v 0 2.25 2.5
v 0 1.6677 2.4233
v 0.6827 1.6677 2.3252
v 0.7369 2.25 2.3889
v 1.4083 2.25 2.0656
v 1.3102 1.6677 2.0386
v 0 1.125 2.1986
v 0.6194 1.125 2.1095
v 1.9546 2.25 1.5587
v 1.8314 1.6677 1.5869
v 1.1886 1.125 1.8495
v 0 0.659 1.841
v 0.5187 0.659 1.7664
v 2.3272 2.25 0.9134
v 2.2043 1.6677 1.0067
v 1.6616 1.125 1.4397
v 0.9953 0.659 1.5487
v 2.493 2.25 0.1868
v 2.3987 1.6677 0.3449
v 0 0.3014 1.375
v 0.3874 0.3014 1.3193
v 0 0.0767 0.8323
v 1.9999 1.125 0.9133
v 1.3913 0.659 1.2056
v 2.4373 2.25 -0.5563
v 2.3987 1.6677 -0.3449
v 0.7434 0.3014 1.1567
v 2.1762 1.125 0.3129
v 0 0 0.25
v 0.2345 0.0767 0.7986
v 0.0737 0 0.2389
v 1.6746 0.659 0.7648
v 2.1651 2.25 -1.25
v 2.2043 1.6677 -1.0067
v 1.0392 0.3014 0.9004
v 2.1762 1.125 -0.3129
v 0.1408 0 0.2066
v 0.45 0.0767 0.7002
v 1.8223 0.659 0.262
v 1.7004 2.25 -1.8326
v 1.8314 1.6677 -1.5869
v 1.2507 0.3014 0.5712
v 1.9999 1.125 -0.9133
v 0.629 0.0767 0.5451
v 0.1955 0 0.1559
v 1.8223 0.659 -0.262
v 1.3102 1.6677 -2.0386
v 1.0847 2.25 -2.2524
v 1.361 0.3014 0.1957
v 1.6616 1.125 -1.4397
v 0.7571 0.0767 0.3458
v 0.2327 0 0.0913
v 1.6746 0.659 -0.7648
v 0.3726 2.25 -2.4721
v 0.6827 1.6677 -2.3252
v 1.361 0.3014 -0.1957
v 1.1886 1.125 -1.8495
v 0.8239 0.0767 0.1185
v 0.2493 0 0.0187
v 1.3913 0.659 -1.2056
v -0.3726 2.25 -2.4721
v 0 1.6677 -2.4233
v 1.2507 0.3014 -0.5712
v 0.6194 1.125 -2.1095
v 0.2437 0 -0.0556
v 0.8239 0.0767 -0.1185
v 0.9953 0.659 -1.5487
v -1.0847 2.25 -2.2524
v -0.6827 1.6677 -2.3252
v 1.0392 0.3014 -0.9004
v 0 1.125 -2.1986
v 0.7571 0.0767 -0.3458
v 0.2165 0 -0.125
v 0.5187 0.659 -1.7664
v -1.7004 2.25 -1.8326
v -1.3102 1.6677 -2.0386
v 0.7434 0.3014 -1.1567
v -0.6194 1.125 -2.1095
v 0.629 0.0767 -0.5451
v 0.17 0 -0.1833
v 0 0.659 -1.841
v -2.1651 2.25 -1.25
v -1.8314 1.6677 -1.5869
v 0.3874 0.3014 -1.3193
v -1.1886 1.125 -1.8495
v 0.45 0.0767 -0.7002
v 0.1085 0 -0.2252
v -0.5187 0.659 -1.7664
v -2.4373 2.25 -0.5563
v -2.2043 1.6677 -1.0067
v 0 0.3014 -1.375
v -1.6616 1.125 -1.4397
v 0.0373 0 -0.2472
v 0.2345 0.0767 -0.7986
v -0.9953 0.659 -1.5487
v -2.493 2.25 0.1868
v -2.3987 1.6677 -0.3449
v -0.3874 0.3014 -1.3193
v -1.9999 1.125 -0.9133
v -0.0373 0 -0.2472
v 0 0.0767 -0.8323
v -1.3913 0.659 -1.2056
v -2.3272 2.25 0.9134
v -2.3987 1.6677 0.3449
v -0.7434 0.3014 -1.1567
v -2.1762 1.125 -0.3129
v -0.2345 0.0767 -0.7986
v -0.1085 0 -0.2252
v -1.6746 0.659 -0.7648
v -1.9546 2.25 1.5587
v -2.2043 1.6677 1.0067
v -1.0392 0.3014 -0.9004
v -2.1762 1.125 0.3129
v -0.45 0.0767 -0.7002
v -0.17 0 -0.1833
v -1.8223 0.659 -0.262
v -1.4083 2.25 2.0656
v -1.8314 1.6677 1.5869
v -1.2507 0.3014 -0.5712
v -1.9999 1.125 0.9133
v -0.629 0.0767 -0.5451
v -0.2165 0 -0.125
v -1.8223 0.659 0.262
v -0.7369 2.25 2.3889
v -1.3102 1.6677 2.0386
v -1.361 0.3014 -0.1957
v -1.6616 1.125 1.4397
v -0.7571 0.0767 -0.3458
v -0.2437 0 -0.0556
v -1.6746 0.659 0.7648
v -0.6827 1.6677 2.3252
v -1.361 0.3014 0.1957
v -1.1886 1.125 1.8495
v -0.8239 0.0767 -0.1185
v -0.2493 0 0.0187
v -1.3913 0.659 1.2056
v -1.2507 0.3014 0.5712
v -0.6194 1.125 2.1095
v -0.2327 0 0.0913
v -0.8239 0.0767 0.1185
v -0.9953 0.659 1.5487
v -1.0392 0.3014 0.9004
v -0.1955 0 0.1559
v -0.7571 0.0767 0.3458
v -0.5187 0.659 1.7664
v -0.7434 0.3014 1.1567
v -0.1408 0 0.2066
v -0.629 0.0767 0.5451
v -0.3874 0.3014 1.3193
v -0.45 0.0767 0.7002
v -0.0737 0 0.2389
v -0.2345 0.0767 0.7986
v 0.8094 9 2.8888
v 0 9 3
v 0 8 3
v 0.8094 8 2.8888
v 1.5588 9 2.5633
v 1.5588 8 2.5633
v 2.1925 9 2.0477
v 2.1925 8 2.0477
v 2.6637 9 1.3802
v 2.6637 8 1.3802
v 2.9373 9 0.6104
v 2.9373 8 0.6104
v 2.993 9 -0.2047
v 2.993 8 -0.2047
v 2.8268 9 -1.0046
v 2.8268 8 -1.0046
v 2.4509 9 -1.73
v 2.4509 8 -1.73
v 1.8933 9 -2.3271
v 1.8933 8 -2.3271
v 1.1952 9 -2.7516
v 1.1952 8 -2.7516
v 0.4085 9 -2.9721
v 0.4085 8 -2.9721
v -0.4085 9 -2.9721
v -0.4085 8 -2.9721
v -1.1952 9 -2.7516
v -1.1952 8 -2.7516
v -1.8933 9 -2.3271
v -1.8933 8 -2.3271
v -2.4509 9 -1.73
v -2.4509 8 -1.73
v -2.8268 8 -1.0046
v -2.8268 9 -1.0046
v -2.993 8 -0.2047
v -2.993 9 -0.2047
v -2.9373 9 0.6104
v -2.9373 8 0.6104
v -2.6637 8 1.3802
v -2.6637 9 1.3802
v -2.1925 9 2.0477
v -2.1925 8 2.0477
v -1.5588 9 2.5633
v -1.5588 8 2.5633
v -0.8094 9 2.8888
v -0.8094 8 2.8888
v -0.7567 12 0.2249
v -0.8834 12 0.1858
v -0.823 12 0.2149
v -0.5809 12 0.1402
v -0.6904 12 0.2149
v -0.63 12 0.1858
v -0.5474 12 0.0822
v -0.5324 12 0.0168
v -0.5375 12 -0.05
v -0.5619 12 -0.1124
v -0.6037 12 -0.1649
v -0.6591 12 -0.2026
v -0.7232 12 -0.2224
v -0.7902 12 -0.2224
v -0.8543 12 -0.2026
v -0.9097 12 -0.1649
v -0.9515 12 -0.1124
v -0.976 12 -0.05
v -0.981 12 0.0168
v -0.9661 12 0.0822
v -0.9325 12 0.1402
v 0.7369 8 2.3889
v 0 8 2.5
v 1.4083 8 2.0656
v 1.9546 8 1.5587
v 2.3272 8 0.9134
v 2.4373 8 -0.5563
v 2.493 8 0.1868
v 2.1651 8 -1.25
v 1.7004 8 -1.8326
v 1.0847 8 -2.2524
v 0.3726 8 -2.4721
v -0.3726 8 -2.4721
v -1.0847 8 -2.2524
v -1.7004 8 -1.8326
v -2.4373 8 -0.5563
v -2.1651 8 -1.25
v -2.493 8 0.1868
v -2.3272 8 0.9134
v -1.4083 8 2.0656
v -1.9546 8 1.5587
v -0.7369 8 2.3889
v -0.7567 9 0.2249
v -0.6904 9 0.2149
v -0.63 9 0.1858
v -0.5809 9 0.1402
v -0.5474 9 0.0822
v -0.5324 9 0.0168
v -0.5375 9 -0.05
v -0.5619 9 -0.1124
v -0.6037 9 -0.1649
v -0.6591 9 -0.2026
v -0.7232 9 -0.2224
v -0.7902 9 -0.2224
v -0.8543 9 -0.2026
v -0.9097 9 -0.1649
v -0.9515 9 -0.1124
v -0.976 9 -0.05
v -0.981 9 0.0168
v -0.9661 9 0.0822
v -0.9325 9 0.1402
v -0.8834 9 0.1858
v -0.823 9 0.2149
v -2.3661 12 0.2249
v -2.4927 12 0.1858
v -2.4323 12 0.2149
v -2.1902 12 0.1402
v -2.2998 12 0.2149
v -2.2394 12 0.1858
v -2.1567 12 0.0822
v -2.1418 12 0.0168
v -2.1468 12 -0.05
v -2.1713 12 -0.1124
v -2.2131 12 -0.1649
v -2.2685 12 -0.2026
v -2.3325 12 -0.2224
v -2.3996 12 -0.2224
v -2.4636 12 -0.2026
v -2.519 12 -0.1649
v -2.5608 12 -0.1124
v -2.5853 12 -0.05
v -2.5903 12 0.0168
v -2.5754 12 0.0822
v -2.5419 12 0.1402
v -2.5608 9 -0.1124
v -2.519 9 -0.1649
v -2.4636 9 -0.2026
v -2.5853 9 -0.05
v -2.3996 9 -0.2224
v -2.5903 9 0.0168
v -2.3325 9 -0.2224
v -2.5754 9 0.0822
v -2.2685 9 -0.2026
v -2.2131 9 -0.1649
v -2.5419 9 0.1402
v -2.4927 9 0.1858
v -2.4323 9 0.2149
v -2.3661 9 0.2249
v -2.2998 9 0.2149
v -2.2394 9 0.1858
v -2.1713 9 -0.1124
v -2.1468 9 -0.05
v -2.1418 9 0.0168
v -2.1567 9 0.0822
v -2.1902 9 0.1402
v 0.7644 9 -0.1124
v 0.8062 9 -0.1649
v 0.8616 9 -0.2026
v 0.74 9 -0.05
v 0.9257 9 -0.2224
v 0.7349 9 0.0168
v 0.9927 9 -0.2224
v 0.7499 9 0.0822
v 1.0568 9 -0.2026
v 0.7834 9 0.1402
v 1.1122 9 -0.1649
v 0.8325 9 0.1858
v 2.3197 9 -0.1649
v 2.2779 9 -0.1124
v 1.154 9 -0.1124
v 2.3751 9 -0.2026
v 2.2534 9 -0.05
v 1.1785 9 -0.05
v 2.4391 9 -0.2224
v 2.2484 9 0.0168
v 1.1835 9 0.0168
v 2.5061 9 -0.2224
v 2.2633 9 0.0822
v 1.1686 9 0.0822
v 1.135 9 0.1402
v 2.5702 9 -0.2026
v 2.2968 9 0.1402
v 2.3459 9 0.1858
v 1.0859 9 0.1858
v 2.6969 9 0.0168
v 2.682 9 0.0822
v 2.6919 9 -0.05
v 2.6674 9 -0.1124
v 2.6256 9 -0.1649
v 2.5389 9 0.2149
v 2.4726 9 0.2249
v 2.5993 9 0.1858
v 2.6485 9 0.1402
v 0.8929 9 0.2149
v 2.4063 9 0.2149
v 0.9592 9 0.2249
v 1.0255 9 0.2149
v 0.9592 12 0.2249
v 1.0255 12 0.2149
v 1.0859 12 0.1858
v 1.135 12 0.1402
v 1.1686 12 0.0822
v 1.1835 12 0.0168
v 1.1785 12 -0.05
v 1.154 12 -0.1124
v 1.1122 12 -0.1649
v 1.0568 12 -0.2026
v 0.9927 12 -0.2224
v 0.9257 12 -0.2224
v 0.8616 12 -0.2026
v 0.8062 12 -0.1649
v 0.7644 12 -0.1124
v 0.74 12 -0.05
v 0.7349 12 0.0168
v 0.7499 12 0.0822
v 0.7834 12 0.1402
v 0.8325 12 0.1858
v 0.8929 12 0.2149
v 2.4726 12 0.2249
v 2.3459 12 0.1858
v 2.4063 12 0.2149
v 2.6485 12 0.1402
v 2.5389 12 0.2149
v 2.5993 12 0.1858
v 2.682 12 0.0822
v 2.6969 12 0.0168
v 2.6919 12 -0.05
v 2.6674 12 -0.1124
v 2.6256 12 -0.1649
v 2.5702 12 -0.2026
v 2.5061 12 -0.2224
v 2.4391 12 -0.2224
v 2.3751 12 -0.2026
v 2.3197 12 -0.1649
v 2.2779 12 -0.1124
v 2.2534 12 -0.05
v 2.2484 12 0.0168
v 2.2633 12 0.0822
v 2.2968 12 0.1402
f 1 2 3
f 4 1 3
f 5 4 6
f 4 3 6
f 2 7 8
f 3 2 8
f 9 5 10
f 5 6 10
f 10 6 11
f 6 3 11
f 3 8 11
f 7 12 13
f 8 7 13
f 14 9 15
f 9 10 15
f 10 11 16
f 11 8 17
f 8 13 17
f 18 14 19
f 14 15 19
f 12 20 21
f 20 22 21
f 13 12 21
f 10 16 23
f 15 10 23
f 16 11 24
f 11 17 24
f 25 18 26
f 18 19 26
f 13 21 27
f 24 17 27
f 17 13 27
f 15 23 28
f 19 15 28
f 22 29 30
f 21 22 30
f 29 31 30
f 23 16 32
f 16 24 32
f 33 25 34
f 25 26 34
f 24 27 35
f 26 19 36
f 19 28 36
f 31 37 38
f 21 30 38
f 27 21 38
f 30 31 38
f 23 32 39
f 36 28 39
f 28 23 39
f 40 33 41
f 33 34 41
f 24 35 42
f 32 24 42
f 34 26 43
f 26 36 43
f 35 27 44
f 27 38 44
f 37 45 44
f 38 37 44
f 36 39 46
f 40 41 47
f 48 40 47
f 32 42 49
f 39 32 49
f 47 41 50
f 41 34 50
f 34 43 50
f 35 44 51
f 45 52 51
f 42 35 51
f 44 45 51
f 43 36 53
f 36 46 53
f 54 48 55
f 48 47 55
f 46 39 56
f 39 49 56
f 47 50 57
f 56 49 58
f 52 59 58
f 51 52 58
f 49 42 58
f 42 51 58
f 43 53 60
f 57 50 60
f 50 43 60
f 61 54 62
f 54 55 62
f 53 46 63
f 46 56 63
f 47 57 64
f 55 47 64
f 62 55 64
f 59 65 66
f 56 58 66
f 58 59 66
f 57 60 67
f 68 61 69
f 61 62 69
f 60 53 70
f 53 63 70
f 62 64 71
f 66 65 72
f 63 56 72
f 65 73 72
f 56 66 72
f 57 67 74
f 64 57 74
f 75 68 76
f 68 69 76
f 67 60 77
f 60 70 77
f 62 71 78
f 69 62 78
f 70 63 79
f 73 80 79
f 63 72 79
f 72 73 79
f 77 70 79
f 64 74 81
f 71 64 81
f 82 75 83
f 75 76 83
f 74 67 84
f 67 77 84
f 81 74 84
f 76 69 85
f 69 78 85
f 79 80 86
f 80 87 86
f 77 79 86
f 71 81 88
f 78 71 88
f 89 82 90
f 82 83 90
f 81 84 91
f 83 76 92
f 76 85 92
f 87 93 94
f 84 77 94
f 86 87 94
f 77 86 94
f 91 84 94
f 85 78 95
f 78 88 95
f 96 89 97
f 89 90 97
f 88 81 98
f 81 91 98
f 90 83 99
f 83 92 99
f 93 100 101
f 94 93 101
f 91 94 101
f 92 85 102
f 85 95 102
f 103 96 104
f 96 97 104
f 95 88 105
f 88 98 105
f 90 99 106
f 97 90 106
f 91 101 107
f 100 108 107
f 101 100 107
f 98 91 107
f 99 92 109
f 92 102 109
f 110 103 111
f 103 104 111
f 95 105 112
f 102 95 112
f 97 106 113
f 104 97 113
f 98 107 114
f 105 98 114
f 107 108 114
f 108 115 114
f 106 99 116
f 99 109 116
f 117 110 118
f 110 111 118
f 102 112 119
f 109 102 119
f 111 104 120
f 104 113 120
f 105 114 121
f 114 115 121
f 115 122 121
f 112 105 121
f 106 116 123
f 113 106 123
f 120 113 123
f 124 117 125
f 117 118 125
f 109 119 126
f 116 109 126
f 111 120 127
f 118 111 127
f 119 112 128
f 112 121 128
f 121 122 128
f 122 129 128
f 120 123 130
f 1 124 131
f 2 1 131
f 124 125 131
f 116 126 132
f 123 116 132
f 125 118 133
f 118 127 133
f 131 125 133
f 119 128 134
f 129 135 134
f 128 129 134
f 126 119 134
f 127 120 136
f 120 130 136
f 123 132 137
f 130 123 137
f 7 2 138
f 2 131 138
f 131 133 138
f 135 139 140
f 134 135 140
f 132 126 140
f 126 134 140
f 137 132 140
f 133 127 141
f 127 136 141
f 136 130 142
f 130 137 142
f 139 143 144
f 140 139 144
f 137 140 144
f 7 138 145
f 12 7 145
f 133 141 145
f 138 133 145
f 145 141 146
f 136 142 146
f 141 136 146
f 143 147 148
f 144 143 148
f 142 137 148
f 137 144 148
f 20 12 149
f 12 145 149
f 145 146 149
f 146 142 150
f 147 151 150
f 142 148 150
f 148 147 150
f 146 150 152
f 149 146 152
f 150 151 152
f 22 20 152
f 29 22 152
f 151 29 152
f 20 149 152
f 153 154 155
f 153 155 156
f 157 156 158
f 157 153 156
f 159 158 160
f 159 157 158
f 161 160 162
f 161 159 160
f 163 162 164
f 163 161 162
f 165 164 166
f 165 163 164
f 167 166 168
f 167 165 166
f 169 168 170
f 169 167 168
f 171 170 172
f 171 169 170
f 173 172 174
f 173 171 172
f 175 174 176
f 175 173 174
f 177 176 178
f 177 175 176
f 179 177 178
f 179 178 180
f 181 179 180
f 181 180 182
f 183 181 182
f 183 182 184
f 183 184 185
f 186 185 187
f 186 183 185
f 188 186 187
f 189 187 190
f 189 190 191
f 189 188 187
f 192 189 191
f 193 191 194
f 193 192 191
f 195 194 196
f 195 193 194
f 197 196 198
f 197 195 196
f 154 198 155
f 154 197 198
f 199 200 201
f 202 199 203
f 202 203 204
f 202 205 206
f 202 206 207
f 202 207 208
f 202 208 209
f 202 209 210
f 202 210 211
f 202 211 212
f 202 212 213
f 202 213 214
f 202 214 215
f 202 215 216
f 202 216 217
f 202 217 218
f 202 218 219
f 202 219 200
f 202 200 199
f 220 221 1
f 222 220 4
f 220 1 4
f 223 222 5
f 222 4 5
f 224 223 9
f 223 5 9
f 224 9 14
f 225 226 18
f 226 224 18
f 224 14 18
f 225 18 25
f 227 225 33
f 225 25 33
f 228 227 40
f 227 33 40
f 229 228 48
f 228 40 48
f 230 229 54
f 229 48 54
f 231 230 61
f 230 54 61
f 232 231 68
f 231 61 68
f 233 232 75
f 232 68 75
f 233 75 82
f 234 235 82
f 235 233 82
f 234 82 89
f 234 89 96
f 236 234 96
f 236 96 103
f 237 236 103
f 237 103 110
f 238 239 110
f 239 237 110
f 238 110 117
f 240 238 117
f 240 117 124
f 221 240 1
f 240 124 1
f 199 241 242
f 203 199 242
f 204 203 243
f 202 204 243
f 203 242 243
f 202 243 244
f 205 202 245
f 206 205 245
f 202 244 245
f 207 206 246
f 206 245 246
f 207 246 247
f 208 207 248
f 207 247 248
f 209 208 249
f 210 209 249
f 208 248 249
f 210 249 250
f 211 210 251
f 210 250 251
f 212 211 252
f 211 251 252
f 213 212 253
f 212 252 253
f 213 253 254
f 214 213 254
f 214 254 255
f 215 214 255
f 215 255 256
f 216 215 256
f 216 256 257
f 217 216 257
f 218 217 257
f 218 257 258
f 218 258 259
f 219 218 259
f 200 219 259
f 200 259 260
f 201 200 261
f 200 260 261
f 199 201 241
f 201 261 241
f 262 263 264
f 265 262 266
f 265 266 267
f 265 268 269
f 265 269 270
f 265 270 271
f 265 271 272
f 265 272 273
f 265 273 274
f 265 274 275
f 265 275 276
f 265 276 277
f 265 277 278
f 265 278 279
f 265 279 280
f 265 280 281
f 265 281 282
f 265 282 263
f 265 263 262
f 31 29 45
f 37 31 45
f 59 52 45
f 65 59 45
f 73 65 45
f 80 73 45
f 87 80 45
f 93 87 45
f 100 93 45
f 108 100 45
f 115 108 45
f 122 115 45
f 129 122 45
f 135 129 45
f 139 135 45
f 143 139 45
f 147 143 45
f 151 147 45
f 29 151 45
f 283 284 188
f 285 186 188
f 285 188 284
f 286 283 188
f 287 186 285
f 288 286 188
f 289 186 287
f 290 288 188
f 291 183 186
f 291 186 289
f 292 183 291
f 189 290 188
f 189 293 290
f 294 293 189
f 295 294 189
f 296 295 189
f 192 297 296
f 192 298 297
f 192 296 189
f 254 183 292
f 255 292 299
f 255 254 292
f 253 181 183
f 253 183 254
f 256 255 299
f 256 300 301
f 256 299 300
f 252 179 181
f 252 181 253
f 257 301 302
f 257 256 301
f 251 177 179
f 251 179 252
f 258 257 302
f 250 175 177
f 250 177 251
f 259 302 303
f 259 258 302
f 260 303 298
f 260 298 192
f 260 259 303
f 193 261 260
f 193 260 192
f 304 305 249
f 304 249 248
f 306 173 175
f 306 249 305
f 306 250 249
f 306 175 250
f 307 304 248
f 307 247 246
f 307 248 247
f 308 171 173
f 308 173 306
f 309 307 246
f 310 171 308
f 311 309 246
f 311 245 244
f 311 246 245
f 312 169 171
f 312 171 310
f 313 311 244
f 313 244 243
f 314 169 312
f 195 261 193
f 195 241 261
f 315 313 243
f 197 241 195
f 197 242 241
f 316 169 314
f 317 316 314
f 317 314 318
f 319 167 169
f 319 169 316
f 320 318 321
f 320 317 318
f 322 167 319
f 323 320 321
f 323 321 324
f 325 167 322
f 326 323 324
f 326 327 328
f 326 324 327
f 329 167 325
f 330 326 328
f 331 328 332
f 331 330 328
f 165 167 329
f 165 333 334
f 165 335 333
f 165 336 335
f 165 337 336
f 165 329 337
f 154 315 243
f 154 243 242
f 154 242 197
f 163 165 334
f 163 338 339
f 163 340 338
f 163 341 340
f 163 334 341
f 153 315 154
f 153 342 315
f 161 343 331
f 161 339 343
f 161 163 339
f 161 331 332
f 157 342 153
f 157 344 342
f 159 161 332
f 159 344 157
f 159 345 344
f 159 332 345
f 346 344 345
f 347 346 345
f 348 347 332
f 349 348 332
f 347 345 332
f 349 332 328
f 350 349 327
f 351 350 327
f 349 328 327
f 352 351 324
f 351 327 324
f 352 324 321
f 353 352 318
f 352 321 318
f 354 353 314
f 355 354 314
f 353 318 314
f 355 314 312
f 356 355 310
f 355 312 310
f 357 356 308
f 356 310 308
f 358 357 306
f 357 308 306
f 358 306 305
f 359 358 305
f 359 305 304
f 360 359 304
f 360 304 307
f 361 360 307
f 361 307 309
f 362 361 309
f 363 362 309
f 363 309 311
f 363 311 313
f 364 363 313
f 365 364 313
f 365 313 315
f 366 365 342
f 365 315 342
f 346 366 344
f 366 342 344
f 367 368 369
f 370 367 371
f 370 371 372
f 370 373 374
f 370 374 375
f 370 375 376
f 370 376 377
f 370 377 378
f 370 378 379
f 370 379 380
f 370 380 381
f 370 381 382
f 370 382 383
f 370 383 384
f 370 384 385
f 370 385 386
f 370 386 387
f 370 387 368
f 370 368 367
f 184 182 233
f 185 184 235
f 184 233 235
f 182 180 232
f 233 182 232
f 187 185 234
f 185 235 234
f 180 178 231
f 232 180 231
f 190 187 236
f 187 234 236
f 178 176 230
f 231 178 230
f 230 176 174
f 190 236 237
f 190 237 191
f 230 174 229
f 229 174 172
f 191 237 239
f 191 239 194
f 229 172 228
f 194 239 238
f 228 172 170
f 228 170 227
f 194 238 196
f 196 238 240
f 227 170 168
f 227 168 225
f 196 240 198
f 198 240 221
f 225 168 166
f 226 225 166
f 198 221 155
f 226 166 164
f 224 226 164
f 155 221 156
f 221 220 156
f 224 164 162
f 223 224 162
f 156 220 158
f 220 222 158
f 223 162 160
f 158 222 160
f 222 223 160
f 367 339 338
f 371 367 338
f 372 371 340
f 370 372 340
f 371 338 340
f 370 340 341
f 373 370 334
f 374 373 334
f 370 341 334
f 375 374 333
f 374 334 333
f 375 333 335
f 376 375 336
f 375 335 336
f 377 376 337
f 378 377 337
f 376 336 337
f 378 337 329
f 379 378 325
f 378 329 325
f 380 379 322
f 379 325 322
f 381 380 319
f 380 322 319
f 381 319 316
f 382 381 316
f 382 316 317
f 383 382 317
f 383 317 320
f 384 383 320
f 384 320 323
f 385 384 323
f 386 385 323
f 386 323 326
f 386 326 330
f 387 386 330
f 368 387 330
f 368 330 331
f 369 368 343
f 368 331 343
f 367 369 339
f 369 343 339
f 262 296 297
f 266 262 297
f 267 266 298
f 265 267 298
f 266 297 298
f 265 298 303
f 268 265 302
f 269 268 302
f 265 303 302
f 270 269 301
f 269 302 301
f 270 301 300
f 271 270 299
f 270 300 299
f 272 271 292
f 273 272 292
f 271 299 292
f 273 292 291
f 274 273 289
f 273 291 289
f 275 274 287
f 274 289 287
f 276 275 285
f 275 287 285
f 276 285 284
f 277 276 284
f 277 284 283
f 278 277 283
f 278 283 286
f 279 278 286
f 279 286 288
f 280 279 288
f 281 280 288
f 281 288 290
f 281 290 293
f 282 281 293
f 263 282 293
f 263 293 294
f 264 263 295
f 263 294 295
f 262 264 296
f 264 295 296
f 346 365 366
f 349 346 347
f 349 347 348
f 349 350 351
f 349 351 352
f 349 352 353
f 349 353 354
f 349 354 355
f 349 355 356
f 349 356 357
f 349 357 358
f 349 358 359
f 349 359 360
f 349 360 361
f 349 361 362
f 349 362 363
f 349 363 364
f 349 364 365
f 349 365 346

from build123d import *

# Parameters (mm, degrees)
SKETCH1_R           = 2.5
BOSS_EXTRUDE1_DEPTH = 9
SKETCH2_R           = 3
BOSS_EXTRUDE3_DEPTH = 1
FILLET3_R           = 2.25
SKETCH4_R           = 0.224891602
BOSS_EXTRUDE4_DEPTH = 3


with BuildPart() as part:
    # Sketch1 → Boss-Extrude1 (new body)
    with BuildSketch(Plane(origin=(0, 0, 0), x_dir=(1, 0, 0), z_dir=(0, 1, 0))):
        with Locations(Location((0, 0, 0), (0, 0, 270))):  # turned: the seam where the file's is
            Circle(SKETCH1_R)
    extrude(amount=BOSS_EXTRUDE1_DEPTH)

    # Sketch2 → Boss-Extrude3 (add)
    with BuildSketch(Plane(origin=(0, 9, 0), x_dir=(1, 0, 0), z_dir=(0, 1, 0))):
        with Locations(Location((0, 0, 0), (0, 0, 270))):  # turned: the seam where the file's is
            Circle(SKETCH2_R)
    extrude(amount=-BOSS_EXTRUDE3_DEPTH)

    # Fillet3
    fillet3_edges = [part.edges().sort_by_distance(p)[0] for p in [
        (0, 0, -2.5),
    ]]
    fillet(fillet3_edges, radius=FILLET3_R)

    # Sketch4 → Boss-Extrude4 (add)
    with BuildSketch(Plane(origin=(0, 9, 0), x_dir=(1, 0, 0), z_dir=(0, 1, 0))):
        with Locations(Location((-2.366051797, 0, 0), (0, 0, 270))):  # turned: the seam where the file's is
            Circle(SKETCH4_R)
        with Locations(Location((-0.756710259, 0, 0), (0, 0, 270))):  # turned: the seam where the file's is
            Circle(SKETCH4_R)
        with Locations(Location((0.959210188, 0, 0), (0, 0, 270))):  # turned: the seam where the file's is
            Circle(SKETCH4_R)
        with Locations(Location((2.472630707, 0, 0), (0, 0, 270))):  # turned: the seam where the file's is
            Circle(SKETCH4_R)
    extrude(amount=BOSS_EXTRUDE4_DEPTH)


solid = part.part
